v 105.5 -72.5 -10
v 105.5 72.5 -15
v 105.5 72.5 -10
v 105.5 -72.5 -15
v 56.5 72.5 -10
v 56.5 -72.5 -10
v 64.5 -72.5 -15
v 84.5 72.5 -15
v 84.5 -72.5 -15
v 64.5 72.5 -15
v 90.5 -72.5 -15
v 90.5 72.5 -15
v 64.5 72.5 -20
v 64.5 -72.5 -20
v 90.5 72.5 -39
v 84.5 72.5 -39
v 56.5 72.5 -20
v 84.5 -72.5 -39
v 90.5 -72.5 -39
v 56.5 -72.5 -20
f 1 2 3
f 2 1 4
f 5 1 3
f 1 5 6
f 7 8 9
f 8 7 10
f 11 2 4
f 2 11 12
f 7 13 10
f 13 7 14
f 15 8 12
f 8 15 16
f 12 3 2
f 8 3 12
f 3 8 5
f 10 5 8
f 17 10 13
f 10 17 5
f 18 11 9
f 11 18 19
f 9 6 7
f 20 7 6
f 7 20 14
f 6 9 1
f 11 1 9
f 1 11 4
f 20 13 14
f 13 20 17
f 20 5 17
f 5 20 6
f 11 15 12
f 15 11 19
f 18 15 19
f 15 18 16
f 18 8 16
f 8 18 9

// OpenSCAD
// file: ../Settings.scad
// Mesurements Of Platform Actual & Global Settings
// Mesurements ACTUAL
PlateWidth = 228;
PlateDepth = 145;
PlateHeight = 5;

ArmWidth = 20;
ArmHeight = 24;
ArmForwardProjection = 25;
ArmRearProjection = 50;
ArmVOffset = 15;

BaseWidth = 129;
BaseHeight = 5;
BaseForwardProjection = 10;
BaseRearProjection = 10;
BaseVOffset = 20;

BaseDeflectorLength = 20;
BaseDeflectorAngle = 45;

ScrewsWidthOutset = 35;
ScrewsDepthOutset = 35;
ScrewsHeadRadius = 10;
ScrewsHeadHeight = 2;
ScrewsHeadProtrusion = 5;
ScrewsShaftRadius = 2;
ScrewsHeadCutoutRadius = 2;

RearPlugWidth = 10;
RearPlugHeight = 5;
RearPlugVOffset = 1;

// Options
// ****************************************************************************************************

d = 0.05;   //Delta

ClipSticksize = 8;
PlateThickness = 5;

TensionerBearingRadius = 2;
TensionerOffsetRadius = 15;
TensionerAngle = 45;
TensionerBearingExtention = 3;
TensionerInset = 2;

//lips to keep the belt in
Lip = 3;
//TopLip = 500;
BottomLip = 5;

MidPlateOverlap = 20;
MidPlateOverlapHeight = 10;
MidPlateOverlapOffset = 7;
ClipHoleSize = 5;

LowerPlateCrossover =10;

RollerCore = 2;
RollerClearance = 2;
RollerLength = PlateDepth - 2*RollerClearance;

UpperRollerProjection  = 40;
UpperRollerRadius = 8;

LowerRollerProjection = 20;
LowerRollerRadius = 6;

RollerBearingCutoutRadius = 3;

IbeamProjection = 15;
IbeamPlateThikness = 6;


// Calculated
// ************************************************************************************************************
PlateX = BaseWidth/2;

RollerLength = PlateDepth - 2*RollerClearance;
PlateArmOverhang = PlateWidth/2 - BaseWidth/2  - ArmWidth; 

UpperRollerPlateX = ArmWidth+PlateArmOverhang+UpperRollerProjection-UpperRollerRadius;
UpperRollerPlateY = -UpperRollerRadius; 

LowerRollerPlateX = ArmWidth+PlateArmOverhang+LowerRollerProjection-LowerRollerRadius;
LowerRollerPlateY = -(ArmVOffset+ArmHeight)+LowerRollerRadius;
// main file
// contructed view


include <../Settings.scad>;

LBeam();


module LBeam(){
union(){
translate(v= [BaseWidth/2,-PlateDepth/2,-ArmVOffset])
	color("green")cube(size = [ArmWidth+IbeamPlateThikness+IbeamProjection,PlateDepth,5]);

//left beam
translate(v= [BaseWidth/2-ClipSticksize,-PlateDepth/2,-ArmVOffset-(BaseVOffset-ArmVOffset)])
	color("blue")cube(size = [ClipSticksize,PlateDepth,  BaseVOffset-ArmVOffset+5    ]);

translate(v= [BaseWidth/2+ArmWidth,-PlateDepth/2,-ArmVOffset-ArmHeight])
	color("Red")cube(size = [IbeamPlateThikness,PlateDepth,  ArmHeight   ]);
}
}
